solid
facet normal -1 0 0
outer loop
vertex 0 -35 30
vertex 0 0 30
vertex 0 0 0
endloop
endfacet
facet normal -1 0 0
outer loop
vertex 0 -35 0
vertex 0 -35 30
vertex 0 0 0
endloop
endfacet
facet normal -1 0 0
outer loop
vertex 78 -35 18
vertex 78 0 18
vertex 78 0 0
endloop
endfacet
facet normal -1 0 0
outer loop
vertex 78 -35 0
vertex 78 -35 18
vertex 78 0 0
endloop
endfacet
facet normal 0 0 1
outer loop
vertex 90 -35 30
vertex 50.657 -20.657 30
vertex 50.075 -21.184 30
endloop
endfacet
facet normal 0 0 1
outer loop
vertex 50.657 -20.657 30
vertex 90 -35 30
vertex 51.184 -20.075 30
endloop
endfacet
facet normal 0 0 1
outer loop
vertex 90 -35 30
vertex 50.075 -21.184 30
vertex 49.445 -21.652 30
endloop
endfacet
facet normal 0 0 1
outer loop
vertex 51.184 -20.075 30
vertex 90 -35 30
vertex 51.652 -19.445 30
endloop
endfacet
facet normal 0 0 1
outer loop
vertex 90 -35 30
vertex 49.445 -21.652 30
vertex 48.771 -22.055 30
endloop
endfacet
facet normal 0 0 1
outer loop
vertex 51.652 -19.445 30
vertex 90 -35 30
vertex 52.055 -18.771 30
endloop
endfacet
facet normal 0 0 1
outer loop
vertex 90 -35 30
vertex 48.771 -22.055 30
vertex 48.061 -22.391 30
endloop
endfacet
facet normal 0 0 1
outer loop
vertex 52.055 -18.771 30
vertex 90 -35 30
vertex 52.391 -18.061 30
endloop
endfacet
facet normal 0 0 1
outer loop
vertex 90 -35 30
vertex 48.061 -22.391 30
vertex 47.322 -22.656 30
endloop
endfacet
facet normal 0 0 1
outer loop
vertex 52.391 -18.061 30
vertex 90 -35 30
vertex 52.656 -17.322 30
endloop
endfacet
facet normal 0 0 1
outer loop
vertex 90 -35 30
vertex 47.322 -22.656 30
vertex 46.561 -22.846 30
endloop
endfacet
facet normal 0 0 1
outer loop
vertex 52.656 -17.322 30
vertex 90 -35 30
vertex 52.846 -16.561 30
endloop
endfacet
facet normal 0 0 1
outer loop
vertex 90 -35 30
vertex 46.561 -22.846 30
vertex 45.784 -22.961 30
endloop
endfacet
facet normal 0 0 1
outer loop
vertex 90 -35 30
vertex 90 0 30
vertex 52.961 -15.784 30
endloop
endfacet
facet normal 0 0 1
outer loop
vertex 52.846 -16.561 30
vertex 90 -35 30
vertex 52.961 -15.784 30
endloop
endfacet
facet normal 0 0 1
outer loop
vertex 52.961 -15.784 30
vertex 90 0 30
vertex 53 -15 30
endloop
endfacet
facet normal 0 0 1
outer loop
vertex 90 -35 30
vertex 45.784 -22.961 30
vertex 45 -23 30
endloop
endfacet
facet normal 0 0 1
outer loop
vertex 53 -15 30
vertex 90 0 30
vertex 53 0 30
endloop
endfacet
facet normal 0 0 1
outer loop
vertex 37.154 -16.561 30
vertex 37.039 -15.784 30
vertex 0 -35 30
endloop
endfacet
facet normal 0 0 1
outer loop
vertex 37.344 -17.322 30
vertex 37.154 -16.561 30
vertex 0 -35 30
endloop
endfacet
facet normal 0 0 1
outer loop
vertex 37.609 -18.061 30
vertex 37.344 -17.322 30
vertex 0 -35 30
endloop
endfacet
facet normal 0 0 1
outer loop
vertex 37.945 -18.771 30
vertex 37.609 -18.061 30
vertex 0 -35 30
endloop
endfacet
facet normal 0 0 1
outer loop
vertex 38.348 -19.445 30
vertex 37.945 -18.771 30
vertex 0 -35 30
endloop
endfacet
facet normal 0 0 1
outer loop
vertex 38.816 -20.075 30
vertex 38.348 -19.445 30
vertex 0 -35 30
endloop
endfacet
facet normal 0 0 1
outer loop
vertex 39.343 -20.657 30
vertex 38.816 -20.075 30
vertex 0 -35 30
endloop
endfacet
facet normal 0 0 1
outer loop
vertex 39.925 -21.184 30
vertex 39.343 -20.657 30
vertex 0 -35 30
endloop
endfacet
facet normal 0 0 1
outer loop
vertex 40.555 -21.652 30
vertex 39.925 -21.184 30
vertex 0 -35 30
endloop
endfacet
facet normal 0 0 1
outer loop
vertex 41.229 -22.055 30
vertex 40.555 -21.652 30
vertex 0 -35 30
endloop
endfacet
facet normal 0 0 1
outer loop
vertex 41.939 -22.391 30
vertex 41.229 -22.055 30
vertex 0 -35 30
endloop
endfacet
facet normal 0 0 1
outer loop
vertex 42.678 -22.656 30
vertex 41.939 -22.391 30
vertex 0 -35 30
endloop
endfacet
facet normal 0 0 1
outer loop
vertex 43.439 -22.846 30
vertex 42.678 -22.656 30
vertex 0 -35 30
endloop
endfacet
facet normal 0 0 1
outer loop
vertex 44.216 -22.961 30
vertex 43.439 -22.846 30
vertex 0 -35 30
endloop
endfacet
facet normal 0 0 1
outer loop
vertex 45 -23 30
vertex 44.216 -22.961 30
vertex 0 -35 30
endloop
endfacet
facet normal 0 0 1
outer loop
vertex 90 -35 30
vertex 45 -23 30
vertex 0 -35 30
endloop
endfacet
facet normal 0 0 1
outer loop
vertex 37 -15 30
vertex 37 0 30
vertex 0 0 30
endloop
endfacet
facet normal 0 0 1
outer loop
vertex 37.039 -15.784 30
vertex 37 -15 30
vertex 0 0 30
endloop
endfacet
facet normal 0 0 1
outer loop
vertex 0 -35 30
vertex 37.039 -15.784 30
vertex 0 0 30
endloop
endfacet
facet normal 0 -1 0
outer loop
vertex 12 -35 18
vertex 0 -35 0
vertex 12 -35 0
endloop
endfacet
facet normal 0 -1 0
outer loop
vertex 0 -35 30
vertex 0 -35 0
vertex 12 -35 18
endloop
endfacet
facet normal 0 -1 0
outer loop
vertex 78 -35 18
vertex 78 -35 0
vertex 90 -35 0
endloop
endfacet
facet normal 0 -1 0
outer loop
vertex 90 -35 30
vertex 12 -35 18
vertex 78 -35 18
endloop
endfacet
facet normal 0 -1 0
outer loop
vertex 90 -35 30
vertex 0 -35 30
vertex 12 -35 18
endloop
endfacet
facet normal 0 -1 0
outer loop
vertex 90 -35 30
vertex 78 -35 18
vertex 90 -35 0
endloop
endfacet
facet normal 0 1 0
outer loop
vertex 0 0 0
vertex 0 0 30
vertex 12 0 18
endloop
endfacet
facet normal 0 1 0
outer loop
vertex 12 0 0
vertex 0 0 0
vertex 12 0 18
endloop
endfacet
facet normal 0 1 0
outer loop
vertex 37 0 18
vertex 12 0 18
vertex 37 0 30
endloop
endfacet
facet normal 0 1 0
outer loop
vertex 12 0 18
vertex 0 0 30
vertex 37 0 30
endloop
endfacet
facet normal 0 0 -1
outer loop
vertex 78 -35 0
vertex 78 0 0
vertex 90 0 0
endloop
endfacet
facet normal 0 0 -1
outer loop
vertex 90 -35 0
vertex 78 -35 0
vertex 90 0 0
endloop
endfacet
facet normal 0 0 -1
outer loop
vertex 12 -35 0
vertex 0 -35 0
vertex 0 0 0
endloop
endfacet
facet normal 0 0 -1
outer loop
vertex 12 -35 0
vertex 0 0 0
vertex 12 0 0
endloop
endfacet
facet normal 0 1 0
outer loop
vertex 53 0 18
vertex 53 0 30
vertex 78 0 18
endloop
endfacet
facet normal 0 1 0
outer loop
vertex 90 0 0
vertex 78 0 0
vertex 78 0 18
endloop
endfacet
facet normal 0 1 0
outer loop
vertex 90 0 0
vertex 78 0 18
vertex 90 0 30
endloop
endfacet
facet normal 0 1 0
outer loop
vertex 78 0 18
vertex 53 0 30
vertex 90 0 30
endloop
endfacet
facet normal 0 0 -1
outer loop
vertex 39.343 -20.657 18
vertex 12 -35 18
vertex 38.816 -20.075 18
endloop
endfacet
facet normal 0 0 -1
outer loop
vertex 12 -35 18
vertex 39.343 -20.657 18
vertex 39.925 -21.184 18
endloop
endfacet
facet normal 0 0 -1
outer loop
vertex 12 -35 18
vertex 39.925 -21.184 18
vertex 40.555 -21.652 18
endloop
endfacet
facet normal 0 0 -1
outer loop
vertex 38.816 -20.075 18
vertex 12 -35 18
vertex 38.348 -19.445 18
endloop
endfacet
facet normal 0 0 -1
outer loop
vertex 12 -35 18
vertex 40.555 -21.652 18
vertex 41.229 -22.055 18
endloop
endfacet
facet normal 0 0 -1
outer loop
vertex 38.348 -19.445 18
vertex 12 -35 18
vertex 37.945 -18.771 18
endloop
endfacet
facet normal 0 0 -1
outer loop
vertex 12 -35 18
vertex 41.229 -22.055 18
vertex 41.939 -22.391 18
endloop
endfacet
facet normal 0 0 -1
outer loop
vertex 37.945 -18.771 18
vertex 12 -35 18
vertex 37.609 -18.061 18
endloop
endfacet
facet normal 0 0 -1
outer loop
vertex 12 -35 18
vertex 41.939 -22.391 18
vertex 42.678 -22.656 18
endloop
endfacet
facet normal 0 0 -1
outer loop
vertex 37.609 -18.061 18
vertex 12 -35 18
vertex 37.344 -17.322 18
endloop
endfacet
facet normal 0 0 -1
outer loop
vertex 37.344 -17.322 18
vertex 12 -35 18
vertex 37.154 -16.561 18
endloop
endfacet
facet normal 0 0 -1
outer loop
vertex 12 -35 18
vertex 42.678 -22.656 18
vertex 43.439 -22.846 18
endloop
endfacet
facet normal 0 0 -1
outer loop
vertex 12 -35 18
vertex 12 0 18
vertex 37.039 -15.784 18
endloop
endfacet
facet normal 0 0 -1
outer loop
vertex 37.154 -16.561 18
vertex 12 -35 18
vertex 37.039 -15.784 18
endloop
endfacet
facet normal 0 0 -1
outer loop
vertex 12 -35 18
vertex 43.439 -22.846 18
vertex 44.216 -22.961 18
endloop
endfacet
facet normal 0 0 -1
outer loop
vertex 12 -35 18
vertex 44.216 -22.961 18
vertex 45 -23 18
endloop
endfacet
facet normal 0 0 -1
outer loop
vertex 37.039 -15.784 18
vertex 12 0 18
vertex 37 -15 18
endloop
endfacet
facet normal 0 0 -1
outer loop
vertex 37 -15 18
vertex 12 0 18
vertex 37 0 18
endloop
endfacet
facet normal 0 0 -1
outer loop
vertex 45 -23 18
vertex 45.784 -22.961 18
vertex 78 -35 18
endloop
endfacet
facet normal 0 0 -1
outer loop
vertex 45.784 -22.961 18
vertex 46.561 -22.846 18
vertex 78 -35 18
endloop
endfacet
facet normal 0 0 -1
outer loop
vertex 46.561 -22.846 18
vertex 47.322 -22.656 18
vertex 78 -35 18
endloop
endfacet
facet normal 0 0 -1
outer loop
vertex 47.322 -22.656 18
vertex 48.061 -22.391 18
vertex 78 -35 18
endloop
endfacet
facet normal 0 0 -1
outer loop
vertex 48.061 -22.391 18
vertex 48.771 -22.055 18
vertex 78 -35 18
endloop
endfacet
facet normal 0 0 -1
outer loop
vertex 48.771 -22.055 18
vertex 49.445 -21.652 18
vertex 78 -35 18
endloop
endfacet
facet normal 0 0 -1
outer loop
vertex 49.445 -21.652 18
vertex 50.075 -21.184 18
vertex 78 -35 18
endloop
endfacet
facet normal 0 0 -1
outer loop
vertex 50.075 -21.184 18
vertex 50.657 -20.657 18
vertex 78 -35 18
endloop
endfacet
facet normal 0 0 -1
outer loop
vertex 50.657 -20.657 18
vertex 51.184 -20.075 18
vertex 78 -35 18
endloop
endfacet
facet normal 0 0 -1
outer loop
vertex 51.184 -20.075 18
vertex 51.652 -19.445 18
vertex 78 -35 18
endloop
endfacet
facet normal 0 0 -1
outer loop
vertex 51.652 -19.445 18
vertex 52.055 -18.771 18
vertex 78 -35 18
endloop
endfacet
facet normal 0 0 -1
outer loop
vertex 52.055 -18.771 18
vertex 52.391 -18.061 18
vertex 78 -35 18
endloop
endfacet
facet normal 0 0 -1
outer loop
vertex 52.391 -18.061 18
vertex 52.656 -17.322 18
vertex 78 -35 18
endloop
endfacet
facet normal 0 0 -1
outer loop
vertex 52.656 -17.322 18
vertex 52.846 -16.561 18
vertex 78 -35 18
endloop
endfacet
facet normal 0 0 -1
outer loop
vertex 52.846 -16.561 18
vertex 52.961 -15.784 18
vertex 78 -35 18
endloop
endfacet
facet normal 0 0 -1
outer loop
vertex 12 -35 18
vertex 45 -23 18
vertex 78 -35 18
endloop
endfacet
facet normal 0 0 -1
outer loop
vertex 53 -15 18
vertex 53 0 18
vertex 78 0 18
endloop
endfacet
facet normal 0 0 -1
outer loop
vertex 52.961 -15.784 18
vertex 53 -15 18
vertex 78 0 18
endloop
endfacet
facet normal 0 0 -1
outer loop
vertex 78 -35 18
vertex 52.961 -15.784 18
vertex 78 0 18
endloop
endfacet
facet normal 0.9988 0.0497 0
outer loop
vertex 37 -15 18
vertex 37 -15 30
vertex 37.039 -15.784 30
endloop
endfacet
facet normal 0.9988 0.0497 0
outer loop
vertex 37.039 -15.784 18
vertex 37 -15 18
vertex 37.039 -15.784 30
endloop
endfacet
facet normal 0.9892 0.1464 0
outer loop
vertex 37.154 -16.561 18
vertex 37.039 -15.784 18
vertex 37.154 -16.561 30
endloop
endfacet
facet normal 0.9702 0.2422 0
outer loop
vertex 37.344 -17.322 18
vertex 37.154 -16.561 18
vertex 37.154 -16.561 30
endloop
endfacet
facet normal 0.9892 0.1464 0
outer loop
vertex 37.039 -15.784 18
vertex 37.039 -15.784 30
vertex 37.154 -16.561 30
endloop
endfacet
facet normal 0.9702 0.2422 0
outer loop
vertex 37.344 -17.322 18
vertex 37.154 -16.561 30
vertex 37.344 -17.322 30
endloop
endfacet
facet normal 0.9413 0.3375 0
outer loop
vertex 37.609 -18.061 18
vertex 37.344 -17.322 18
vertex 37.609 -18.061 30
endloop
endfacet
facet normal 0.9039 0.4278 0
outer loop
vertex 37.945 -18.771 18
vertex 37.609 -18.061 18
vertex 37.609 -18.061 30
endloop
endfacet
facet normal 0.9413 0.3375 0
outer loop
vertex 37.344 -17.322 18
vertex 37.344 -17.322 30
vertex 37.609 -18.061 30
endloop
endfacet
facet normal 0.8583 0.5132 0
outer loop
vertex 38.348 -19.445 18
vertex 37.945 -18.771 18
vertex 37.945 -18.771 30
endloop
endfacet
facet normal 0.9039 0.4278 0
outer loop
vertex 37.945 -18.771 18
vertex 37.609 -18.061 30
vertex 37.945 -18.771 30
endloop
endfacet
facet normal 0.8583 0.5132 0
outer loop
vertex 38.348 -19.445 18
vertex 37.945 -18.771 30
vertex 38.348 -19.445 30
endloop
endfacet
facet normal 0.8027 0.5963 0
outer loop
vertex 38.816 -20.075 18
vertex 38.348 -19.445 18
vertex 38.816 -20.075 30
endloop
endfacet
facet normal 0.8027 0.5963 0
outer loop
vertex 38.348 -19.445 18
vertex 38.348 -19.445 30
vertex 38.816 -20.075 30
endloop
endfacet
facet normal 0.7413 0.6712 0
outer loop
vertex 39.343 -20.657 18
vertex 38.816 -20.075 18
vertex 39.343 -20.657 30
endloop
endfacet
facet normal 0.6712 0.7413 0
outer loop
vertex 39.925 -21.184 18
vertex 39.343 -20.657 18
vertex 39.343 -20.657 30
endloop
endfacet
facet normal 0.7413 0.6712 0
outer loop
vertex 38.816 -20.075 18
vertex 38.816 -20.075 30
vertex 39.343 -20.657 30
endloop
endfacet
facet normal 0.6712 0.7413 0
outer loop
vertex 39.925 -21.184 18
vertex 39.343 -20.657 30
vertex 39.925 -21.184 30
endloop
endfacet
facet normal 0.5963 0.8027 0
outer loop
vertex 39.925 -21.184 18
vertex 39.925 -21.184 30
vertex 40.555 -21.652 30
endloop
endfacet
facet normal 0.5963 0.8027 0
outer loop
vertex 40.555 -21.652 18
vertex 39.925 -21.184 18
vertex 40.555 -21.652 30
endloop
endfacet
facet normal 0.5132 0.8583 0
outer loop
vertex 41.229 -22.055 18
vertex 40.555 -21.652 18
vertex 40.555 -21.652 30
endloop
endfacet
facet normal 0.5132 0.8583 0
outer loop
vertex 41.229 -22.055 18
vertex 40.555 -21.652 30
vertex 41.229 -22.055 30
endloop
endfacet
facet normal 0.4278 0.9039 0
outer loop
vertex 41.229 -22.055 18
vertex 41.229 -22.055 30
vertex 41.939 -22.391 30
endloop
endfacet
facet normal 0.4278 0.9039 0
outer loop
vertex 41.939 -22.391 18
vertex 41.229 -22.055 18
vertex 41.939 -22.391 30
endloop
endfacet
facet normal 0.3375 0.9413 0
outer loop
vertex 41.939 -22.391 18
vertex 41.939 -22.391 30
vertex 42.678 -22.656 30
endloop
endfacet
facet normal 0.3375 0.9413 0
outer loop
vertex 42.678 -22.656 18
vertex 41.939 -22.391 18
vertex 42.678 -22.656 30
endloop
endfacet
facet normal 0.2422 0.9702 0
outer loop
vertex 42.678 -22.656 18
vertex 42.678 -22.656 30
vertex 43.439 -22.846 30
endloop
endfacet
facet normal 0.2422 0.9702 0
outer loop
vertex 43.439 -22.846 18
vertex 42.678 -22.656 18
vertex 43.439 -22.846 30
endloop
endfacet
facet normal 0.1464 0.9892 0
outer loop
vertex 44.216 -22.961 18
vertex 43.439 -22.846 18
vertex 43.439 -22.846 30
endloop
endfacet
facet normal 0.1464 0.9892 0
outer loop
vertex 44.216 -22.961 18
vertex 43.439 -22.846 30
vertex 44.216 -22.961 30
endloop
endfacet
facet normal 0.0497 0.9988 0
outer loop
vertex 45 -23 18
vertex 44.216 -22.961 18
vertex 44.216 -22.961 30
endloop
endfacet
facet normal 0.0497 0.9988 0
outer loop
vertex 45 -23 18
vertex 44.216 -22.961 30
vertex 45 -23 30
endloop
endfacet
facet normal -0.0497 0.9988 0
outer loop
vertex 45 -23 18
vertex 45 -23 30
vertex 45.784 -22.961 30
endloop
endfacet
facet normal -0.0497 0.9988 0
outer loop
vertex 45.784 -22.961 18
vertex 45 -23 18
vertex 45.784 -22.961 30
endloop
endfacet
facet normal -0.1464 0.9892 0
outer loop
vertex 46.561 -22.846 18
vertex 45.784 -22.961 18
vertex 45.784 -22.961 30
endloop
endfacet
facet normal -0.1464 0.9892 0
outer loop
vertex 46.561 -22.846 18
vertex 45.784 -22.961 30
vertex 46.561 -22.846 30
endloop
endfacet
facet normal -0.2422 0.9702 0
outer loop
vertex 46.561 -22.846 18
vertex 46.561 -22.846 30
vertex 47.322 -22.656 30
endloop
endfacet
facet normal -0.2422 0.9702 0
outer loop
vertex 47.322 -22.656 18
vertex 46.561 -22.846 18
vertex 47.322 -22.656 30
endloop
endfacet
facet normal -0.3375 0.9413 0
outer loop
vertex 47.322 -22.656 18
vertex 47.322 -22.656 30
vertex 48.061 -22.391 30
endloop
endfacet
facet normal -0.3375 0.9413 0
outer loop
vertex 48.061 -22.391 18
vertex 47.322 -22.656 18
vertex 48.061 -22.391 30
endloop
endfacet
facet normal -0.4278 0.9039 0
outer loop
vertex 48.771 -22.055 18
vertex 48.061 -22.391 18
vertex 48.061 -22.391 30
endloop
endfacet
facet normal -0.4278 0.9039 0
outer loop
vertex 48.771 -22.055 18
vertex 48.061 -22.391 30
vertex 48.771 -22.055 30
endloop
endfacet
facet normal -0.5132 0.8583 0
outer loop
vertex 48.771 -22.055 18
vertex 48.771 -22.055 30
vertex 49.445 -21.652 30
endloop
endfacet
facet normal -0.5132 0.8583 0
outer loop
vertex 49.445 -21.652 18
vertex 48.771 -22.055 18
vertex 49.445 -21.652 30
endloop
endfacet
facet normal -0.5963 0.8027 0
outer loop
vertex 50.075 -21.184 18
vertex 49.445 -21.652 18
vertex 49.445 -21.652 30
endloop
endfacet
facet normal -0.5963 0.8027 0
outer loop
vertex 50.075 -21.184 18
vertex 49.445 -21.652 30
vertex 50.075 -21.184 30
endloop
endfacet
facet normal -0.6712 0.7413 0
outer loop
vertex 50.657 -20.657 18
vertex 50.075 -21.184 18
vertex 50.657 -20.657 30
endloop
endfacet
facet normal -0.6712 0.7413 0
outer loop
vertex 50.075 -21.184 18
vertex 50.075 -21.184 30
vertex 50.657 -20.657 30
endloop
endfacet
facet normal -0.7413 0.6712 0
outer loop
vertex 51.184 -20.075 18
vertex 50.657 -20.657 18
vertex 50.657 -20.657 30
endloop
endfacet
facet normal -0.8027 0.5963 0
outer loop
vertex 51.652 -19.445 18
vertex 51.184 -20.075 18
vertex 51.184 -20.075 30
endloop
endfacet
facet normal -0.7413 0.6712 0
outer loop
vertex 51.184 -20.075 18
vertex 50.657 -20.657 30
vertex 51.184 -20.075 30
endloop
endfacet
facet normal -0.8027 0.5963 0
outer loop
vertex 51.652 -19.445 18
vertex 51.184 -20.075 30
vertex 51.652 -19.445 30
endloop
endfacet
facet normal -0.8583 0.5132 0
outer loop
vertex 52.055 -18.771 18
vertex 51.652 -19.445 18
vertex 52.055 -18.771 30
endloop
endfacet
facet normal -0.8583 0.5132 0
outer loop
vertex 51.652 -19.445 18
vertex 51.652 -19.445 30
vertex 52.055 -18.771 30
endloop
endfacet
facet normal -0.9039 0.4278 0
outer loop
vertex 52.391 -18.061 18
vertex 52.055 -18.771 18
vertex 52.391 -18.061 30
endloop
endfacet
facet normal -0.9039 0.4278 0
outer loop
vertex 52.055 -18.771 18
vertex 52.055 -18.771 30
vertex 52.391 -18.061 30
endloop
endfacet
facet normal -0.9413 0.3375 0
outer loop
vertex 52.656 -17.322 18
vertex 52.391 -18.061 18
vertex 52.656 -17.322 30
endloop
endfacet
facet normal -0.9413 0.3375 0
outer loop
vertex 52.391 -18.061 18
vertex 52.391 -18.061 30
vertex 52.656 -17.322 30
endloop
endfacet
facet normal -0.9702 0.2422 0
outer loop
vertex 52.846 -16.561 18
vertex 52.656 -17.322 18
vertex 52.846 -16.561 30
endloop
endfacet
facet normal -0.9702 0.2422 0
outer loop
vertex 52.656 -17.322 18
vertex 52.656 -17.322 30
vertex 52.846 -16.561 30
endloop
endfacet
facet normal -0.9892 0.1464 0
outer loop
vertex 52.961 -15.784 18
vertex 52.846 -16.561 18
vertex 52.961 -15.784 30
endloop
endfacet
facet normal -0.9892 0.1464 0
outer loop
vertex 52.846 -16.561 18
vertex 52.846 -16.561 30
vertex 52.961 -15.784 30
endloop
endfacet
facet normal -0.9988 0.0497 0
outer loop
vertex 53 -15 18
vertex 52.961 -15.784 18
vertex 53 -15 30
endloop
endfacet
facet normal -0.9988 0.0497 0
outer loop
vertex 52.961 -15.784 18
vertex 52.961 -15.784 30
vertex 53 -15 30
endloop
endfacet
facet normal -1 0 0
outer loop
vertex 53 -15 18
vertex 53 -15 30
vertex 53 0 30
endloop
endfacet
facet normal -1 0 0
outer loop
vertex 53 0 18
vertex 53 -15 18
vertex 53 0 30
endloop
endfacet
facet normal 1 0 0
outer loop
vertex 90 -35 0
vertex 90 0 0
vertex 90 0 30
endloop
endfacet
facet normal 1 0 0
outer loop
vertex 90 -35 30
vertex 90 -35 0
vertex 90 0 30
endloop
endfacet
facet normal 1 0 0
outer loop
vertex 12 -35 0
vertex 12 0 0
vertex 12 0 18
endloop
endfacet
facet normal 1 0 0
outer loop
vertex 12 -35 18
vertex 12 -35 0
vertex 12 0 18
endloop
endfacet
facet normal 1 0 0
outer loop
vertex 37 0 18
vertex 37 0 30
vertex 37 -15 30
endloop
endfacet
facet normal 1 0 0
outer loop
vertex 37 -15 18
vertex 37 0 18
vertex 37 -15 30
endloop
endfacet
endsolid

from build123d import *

# Parameters (mm, degrees)
F1_DEPTH = 35
F3_DEPTH = 30.001


with BuildPart() as f1:
    # F0 (on Front) → F1 (new body)
    with BuildSketch(Plane.XZ):
        Polygon((0, 30), (0, 0), (12, 0), (12, 18), (78, 18), (78, 0), (90, 0), (90, 30), align=None)
    extrude(amount=F1_DEPTH)

    # F2 (on face) → F3 (cut, through all)
    with BuildSketch(Plane.XY.offset(30)):
        with BuildLine():
            Line((37, 0), (37, -15))
            ThreePointArc((37, -15), (45, -23), (53, -15))
            Line((53, -15), (53, 0))
            Line((53, 0), (37, 0))
        make_face()
    extrude(amount=-F3_DEPTH, mode=Mode.SUBTRACT)


solid = f1.part
